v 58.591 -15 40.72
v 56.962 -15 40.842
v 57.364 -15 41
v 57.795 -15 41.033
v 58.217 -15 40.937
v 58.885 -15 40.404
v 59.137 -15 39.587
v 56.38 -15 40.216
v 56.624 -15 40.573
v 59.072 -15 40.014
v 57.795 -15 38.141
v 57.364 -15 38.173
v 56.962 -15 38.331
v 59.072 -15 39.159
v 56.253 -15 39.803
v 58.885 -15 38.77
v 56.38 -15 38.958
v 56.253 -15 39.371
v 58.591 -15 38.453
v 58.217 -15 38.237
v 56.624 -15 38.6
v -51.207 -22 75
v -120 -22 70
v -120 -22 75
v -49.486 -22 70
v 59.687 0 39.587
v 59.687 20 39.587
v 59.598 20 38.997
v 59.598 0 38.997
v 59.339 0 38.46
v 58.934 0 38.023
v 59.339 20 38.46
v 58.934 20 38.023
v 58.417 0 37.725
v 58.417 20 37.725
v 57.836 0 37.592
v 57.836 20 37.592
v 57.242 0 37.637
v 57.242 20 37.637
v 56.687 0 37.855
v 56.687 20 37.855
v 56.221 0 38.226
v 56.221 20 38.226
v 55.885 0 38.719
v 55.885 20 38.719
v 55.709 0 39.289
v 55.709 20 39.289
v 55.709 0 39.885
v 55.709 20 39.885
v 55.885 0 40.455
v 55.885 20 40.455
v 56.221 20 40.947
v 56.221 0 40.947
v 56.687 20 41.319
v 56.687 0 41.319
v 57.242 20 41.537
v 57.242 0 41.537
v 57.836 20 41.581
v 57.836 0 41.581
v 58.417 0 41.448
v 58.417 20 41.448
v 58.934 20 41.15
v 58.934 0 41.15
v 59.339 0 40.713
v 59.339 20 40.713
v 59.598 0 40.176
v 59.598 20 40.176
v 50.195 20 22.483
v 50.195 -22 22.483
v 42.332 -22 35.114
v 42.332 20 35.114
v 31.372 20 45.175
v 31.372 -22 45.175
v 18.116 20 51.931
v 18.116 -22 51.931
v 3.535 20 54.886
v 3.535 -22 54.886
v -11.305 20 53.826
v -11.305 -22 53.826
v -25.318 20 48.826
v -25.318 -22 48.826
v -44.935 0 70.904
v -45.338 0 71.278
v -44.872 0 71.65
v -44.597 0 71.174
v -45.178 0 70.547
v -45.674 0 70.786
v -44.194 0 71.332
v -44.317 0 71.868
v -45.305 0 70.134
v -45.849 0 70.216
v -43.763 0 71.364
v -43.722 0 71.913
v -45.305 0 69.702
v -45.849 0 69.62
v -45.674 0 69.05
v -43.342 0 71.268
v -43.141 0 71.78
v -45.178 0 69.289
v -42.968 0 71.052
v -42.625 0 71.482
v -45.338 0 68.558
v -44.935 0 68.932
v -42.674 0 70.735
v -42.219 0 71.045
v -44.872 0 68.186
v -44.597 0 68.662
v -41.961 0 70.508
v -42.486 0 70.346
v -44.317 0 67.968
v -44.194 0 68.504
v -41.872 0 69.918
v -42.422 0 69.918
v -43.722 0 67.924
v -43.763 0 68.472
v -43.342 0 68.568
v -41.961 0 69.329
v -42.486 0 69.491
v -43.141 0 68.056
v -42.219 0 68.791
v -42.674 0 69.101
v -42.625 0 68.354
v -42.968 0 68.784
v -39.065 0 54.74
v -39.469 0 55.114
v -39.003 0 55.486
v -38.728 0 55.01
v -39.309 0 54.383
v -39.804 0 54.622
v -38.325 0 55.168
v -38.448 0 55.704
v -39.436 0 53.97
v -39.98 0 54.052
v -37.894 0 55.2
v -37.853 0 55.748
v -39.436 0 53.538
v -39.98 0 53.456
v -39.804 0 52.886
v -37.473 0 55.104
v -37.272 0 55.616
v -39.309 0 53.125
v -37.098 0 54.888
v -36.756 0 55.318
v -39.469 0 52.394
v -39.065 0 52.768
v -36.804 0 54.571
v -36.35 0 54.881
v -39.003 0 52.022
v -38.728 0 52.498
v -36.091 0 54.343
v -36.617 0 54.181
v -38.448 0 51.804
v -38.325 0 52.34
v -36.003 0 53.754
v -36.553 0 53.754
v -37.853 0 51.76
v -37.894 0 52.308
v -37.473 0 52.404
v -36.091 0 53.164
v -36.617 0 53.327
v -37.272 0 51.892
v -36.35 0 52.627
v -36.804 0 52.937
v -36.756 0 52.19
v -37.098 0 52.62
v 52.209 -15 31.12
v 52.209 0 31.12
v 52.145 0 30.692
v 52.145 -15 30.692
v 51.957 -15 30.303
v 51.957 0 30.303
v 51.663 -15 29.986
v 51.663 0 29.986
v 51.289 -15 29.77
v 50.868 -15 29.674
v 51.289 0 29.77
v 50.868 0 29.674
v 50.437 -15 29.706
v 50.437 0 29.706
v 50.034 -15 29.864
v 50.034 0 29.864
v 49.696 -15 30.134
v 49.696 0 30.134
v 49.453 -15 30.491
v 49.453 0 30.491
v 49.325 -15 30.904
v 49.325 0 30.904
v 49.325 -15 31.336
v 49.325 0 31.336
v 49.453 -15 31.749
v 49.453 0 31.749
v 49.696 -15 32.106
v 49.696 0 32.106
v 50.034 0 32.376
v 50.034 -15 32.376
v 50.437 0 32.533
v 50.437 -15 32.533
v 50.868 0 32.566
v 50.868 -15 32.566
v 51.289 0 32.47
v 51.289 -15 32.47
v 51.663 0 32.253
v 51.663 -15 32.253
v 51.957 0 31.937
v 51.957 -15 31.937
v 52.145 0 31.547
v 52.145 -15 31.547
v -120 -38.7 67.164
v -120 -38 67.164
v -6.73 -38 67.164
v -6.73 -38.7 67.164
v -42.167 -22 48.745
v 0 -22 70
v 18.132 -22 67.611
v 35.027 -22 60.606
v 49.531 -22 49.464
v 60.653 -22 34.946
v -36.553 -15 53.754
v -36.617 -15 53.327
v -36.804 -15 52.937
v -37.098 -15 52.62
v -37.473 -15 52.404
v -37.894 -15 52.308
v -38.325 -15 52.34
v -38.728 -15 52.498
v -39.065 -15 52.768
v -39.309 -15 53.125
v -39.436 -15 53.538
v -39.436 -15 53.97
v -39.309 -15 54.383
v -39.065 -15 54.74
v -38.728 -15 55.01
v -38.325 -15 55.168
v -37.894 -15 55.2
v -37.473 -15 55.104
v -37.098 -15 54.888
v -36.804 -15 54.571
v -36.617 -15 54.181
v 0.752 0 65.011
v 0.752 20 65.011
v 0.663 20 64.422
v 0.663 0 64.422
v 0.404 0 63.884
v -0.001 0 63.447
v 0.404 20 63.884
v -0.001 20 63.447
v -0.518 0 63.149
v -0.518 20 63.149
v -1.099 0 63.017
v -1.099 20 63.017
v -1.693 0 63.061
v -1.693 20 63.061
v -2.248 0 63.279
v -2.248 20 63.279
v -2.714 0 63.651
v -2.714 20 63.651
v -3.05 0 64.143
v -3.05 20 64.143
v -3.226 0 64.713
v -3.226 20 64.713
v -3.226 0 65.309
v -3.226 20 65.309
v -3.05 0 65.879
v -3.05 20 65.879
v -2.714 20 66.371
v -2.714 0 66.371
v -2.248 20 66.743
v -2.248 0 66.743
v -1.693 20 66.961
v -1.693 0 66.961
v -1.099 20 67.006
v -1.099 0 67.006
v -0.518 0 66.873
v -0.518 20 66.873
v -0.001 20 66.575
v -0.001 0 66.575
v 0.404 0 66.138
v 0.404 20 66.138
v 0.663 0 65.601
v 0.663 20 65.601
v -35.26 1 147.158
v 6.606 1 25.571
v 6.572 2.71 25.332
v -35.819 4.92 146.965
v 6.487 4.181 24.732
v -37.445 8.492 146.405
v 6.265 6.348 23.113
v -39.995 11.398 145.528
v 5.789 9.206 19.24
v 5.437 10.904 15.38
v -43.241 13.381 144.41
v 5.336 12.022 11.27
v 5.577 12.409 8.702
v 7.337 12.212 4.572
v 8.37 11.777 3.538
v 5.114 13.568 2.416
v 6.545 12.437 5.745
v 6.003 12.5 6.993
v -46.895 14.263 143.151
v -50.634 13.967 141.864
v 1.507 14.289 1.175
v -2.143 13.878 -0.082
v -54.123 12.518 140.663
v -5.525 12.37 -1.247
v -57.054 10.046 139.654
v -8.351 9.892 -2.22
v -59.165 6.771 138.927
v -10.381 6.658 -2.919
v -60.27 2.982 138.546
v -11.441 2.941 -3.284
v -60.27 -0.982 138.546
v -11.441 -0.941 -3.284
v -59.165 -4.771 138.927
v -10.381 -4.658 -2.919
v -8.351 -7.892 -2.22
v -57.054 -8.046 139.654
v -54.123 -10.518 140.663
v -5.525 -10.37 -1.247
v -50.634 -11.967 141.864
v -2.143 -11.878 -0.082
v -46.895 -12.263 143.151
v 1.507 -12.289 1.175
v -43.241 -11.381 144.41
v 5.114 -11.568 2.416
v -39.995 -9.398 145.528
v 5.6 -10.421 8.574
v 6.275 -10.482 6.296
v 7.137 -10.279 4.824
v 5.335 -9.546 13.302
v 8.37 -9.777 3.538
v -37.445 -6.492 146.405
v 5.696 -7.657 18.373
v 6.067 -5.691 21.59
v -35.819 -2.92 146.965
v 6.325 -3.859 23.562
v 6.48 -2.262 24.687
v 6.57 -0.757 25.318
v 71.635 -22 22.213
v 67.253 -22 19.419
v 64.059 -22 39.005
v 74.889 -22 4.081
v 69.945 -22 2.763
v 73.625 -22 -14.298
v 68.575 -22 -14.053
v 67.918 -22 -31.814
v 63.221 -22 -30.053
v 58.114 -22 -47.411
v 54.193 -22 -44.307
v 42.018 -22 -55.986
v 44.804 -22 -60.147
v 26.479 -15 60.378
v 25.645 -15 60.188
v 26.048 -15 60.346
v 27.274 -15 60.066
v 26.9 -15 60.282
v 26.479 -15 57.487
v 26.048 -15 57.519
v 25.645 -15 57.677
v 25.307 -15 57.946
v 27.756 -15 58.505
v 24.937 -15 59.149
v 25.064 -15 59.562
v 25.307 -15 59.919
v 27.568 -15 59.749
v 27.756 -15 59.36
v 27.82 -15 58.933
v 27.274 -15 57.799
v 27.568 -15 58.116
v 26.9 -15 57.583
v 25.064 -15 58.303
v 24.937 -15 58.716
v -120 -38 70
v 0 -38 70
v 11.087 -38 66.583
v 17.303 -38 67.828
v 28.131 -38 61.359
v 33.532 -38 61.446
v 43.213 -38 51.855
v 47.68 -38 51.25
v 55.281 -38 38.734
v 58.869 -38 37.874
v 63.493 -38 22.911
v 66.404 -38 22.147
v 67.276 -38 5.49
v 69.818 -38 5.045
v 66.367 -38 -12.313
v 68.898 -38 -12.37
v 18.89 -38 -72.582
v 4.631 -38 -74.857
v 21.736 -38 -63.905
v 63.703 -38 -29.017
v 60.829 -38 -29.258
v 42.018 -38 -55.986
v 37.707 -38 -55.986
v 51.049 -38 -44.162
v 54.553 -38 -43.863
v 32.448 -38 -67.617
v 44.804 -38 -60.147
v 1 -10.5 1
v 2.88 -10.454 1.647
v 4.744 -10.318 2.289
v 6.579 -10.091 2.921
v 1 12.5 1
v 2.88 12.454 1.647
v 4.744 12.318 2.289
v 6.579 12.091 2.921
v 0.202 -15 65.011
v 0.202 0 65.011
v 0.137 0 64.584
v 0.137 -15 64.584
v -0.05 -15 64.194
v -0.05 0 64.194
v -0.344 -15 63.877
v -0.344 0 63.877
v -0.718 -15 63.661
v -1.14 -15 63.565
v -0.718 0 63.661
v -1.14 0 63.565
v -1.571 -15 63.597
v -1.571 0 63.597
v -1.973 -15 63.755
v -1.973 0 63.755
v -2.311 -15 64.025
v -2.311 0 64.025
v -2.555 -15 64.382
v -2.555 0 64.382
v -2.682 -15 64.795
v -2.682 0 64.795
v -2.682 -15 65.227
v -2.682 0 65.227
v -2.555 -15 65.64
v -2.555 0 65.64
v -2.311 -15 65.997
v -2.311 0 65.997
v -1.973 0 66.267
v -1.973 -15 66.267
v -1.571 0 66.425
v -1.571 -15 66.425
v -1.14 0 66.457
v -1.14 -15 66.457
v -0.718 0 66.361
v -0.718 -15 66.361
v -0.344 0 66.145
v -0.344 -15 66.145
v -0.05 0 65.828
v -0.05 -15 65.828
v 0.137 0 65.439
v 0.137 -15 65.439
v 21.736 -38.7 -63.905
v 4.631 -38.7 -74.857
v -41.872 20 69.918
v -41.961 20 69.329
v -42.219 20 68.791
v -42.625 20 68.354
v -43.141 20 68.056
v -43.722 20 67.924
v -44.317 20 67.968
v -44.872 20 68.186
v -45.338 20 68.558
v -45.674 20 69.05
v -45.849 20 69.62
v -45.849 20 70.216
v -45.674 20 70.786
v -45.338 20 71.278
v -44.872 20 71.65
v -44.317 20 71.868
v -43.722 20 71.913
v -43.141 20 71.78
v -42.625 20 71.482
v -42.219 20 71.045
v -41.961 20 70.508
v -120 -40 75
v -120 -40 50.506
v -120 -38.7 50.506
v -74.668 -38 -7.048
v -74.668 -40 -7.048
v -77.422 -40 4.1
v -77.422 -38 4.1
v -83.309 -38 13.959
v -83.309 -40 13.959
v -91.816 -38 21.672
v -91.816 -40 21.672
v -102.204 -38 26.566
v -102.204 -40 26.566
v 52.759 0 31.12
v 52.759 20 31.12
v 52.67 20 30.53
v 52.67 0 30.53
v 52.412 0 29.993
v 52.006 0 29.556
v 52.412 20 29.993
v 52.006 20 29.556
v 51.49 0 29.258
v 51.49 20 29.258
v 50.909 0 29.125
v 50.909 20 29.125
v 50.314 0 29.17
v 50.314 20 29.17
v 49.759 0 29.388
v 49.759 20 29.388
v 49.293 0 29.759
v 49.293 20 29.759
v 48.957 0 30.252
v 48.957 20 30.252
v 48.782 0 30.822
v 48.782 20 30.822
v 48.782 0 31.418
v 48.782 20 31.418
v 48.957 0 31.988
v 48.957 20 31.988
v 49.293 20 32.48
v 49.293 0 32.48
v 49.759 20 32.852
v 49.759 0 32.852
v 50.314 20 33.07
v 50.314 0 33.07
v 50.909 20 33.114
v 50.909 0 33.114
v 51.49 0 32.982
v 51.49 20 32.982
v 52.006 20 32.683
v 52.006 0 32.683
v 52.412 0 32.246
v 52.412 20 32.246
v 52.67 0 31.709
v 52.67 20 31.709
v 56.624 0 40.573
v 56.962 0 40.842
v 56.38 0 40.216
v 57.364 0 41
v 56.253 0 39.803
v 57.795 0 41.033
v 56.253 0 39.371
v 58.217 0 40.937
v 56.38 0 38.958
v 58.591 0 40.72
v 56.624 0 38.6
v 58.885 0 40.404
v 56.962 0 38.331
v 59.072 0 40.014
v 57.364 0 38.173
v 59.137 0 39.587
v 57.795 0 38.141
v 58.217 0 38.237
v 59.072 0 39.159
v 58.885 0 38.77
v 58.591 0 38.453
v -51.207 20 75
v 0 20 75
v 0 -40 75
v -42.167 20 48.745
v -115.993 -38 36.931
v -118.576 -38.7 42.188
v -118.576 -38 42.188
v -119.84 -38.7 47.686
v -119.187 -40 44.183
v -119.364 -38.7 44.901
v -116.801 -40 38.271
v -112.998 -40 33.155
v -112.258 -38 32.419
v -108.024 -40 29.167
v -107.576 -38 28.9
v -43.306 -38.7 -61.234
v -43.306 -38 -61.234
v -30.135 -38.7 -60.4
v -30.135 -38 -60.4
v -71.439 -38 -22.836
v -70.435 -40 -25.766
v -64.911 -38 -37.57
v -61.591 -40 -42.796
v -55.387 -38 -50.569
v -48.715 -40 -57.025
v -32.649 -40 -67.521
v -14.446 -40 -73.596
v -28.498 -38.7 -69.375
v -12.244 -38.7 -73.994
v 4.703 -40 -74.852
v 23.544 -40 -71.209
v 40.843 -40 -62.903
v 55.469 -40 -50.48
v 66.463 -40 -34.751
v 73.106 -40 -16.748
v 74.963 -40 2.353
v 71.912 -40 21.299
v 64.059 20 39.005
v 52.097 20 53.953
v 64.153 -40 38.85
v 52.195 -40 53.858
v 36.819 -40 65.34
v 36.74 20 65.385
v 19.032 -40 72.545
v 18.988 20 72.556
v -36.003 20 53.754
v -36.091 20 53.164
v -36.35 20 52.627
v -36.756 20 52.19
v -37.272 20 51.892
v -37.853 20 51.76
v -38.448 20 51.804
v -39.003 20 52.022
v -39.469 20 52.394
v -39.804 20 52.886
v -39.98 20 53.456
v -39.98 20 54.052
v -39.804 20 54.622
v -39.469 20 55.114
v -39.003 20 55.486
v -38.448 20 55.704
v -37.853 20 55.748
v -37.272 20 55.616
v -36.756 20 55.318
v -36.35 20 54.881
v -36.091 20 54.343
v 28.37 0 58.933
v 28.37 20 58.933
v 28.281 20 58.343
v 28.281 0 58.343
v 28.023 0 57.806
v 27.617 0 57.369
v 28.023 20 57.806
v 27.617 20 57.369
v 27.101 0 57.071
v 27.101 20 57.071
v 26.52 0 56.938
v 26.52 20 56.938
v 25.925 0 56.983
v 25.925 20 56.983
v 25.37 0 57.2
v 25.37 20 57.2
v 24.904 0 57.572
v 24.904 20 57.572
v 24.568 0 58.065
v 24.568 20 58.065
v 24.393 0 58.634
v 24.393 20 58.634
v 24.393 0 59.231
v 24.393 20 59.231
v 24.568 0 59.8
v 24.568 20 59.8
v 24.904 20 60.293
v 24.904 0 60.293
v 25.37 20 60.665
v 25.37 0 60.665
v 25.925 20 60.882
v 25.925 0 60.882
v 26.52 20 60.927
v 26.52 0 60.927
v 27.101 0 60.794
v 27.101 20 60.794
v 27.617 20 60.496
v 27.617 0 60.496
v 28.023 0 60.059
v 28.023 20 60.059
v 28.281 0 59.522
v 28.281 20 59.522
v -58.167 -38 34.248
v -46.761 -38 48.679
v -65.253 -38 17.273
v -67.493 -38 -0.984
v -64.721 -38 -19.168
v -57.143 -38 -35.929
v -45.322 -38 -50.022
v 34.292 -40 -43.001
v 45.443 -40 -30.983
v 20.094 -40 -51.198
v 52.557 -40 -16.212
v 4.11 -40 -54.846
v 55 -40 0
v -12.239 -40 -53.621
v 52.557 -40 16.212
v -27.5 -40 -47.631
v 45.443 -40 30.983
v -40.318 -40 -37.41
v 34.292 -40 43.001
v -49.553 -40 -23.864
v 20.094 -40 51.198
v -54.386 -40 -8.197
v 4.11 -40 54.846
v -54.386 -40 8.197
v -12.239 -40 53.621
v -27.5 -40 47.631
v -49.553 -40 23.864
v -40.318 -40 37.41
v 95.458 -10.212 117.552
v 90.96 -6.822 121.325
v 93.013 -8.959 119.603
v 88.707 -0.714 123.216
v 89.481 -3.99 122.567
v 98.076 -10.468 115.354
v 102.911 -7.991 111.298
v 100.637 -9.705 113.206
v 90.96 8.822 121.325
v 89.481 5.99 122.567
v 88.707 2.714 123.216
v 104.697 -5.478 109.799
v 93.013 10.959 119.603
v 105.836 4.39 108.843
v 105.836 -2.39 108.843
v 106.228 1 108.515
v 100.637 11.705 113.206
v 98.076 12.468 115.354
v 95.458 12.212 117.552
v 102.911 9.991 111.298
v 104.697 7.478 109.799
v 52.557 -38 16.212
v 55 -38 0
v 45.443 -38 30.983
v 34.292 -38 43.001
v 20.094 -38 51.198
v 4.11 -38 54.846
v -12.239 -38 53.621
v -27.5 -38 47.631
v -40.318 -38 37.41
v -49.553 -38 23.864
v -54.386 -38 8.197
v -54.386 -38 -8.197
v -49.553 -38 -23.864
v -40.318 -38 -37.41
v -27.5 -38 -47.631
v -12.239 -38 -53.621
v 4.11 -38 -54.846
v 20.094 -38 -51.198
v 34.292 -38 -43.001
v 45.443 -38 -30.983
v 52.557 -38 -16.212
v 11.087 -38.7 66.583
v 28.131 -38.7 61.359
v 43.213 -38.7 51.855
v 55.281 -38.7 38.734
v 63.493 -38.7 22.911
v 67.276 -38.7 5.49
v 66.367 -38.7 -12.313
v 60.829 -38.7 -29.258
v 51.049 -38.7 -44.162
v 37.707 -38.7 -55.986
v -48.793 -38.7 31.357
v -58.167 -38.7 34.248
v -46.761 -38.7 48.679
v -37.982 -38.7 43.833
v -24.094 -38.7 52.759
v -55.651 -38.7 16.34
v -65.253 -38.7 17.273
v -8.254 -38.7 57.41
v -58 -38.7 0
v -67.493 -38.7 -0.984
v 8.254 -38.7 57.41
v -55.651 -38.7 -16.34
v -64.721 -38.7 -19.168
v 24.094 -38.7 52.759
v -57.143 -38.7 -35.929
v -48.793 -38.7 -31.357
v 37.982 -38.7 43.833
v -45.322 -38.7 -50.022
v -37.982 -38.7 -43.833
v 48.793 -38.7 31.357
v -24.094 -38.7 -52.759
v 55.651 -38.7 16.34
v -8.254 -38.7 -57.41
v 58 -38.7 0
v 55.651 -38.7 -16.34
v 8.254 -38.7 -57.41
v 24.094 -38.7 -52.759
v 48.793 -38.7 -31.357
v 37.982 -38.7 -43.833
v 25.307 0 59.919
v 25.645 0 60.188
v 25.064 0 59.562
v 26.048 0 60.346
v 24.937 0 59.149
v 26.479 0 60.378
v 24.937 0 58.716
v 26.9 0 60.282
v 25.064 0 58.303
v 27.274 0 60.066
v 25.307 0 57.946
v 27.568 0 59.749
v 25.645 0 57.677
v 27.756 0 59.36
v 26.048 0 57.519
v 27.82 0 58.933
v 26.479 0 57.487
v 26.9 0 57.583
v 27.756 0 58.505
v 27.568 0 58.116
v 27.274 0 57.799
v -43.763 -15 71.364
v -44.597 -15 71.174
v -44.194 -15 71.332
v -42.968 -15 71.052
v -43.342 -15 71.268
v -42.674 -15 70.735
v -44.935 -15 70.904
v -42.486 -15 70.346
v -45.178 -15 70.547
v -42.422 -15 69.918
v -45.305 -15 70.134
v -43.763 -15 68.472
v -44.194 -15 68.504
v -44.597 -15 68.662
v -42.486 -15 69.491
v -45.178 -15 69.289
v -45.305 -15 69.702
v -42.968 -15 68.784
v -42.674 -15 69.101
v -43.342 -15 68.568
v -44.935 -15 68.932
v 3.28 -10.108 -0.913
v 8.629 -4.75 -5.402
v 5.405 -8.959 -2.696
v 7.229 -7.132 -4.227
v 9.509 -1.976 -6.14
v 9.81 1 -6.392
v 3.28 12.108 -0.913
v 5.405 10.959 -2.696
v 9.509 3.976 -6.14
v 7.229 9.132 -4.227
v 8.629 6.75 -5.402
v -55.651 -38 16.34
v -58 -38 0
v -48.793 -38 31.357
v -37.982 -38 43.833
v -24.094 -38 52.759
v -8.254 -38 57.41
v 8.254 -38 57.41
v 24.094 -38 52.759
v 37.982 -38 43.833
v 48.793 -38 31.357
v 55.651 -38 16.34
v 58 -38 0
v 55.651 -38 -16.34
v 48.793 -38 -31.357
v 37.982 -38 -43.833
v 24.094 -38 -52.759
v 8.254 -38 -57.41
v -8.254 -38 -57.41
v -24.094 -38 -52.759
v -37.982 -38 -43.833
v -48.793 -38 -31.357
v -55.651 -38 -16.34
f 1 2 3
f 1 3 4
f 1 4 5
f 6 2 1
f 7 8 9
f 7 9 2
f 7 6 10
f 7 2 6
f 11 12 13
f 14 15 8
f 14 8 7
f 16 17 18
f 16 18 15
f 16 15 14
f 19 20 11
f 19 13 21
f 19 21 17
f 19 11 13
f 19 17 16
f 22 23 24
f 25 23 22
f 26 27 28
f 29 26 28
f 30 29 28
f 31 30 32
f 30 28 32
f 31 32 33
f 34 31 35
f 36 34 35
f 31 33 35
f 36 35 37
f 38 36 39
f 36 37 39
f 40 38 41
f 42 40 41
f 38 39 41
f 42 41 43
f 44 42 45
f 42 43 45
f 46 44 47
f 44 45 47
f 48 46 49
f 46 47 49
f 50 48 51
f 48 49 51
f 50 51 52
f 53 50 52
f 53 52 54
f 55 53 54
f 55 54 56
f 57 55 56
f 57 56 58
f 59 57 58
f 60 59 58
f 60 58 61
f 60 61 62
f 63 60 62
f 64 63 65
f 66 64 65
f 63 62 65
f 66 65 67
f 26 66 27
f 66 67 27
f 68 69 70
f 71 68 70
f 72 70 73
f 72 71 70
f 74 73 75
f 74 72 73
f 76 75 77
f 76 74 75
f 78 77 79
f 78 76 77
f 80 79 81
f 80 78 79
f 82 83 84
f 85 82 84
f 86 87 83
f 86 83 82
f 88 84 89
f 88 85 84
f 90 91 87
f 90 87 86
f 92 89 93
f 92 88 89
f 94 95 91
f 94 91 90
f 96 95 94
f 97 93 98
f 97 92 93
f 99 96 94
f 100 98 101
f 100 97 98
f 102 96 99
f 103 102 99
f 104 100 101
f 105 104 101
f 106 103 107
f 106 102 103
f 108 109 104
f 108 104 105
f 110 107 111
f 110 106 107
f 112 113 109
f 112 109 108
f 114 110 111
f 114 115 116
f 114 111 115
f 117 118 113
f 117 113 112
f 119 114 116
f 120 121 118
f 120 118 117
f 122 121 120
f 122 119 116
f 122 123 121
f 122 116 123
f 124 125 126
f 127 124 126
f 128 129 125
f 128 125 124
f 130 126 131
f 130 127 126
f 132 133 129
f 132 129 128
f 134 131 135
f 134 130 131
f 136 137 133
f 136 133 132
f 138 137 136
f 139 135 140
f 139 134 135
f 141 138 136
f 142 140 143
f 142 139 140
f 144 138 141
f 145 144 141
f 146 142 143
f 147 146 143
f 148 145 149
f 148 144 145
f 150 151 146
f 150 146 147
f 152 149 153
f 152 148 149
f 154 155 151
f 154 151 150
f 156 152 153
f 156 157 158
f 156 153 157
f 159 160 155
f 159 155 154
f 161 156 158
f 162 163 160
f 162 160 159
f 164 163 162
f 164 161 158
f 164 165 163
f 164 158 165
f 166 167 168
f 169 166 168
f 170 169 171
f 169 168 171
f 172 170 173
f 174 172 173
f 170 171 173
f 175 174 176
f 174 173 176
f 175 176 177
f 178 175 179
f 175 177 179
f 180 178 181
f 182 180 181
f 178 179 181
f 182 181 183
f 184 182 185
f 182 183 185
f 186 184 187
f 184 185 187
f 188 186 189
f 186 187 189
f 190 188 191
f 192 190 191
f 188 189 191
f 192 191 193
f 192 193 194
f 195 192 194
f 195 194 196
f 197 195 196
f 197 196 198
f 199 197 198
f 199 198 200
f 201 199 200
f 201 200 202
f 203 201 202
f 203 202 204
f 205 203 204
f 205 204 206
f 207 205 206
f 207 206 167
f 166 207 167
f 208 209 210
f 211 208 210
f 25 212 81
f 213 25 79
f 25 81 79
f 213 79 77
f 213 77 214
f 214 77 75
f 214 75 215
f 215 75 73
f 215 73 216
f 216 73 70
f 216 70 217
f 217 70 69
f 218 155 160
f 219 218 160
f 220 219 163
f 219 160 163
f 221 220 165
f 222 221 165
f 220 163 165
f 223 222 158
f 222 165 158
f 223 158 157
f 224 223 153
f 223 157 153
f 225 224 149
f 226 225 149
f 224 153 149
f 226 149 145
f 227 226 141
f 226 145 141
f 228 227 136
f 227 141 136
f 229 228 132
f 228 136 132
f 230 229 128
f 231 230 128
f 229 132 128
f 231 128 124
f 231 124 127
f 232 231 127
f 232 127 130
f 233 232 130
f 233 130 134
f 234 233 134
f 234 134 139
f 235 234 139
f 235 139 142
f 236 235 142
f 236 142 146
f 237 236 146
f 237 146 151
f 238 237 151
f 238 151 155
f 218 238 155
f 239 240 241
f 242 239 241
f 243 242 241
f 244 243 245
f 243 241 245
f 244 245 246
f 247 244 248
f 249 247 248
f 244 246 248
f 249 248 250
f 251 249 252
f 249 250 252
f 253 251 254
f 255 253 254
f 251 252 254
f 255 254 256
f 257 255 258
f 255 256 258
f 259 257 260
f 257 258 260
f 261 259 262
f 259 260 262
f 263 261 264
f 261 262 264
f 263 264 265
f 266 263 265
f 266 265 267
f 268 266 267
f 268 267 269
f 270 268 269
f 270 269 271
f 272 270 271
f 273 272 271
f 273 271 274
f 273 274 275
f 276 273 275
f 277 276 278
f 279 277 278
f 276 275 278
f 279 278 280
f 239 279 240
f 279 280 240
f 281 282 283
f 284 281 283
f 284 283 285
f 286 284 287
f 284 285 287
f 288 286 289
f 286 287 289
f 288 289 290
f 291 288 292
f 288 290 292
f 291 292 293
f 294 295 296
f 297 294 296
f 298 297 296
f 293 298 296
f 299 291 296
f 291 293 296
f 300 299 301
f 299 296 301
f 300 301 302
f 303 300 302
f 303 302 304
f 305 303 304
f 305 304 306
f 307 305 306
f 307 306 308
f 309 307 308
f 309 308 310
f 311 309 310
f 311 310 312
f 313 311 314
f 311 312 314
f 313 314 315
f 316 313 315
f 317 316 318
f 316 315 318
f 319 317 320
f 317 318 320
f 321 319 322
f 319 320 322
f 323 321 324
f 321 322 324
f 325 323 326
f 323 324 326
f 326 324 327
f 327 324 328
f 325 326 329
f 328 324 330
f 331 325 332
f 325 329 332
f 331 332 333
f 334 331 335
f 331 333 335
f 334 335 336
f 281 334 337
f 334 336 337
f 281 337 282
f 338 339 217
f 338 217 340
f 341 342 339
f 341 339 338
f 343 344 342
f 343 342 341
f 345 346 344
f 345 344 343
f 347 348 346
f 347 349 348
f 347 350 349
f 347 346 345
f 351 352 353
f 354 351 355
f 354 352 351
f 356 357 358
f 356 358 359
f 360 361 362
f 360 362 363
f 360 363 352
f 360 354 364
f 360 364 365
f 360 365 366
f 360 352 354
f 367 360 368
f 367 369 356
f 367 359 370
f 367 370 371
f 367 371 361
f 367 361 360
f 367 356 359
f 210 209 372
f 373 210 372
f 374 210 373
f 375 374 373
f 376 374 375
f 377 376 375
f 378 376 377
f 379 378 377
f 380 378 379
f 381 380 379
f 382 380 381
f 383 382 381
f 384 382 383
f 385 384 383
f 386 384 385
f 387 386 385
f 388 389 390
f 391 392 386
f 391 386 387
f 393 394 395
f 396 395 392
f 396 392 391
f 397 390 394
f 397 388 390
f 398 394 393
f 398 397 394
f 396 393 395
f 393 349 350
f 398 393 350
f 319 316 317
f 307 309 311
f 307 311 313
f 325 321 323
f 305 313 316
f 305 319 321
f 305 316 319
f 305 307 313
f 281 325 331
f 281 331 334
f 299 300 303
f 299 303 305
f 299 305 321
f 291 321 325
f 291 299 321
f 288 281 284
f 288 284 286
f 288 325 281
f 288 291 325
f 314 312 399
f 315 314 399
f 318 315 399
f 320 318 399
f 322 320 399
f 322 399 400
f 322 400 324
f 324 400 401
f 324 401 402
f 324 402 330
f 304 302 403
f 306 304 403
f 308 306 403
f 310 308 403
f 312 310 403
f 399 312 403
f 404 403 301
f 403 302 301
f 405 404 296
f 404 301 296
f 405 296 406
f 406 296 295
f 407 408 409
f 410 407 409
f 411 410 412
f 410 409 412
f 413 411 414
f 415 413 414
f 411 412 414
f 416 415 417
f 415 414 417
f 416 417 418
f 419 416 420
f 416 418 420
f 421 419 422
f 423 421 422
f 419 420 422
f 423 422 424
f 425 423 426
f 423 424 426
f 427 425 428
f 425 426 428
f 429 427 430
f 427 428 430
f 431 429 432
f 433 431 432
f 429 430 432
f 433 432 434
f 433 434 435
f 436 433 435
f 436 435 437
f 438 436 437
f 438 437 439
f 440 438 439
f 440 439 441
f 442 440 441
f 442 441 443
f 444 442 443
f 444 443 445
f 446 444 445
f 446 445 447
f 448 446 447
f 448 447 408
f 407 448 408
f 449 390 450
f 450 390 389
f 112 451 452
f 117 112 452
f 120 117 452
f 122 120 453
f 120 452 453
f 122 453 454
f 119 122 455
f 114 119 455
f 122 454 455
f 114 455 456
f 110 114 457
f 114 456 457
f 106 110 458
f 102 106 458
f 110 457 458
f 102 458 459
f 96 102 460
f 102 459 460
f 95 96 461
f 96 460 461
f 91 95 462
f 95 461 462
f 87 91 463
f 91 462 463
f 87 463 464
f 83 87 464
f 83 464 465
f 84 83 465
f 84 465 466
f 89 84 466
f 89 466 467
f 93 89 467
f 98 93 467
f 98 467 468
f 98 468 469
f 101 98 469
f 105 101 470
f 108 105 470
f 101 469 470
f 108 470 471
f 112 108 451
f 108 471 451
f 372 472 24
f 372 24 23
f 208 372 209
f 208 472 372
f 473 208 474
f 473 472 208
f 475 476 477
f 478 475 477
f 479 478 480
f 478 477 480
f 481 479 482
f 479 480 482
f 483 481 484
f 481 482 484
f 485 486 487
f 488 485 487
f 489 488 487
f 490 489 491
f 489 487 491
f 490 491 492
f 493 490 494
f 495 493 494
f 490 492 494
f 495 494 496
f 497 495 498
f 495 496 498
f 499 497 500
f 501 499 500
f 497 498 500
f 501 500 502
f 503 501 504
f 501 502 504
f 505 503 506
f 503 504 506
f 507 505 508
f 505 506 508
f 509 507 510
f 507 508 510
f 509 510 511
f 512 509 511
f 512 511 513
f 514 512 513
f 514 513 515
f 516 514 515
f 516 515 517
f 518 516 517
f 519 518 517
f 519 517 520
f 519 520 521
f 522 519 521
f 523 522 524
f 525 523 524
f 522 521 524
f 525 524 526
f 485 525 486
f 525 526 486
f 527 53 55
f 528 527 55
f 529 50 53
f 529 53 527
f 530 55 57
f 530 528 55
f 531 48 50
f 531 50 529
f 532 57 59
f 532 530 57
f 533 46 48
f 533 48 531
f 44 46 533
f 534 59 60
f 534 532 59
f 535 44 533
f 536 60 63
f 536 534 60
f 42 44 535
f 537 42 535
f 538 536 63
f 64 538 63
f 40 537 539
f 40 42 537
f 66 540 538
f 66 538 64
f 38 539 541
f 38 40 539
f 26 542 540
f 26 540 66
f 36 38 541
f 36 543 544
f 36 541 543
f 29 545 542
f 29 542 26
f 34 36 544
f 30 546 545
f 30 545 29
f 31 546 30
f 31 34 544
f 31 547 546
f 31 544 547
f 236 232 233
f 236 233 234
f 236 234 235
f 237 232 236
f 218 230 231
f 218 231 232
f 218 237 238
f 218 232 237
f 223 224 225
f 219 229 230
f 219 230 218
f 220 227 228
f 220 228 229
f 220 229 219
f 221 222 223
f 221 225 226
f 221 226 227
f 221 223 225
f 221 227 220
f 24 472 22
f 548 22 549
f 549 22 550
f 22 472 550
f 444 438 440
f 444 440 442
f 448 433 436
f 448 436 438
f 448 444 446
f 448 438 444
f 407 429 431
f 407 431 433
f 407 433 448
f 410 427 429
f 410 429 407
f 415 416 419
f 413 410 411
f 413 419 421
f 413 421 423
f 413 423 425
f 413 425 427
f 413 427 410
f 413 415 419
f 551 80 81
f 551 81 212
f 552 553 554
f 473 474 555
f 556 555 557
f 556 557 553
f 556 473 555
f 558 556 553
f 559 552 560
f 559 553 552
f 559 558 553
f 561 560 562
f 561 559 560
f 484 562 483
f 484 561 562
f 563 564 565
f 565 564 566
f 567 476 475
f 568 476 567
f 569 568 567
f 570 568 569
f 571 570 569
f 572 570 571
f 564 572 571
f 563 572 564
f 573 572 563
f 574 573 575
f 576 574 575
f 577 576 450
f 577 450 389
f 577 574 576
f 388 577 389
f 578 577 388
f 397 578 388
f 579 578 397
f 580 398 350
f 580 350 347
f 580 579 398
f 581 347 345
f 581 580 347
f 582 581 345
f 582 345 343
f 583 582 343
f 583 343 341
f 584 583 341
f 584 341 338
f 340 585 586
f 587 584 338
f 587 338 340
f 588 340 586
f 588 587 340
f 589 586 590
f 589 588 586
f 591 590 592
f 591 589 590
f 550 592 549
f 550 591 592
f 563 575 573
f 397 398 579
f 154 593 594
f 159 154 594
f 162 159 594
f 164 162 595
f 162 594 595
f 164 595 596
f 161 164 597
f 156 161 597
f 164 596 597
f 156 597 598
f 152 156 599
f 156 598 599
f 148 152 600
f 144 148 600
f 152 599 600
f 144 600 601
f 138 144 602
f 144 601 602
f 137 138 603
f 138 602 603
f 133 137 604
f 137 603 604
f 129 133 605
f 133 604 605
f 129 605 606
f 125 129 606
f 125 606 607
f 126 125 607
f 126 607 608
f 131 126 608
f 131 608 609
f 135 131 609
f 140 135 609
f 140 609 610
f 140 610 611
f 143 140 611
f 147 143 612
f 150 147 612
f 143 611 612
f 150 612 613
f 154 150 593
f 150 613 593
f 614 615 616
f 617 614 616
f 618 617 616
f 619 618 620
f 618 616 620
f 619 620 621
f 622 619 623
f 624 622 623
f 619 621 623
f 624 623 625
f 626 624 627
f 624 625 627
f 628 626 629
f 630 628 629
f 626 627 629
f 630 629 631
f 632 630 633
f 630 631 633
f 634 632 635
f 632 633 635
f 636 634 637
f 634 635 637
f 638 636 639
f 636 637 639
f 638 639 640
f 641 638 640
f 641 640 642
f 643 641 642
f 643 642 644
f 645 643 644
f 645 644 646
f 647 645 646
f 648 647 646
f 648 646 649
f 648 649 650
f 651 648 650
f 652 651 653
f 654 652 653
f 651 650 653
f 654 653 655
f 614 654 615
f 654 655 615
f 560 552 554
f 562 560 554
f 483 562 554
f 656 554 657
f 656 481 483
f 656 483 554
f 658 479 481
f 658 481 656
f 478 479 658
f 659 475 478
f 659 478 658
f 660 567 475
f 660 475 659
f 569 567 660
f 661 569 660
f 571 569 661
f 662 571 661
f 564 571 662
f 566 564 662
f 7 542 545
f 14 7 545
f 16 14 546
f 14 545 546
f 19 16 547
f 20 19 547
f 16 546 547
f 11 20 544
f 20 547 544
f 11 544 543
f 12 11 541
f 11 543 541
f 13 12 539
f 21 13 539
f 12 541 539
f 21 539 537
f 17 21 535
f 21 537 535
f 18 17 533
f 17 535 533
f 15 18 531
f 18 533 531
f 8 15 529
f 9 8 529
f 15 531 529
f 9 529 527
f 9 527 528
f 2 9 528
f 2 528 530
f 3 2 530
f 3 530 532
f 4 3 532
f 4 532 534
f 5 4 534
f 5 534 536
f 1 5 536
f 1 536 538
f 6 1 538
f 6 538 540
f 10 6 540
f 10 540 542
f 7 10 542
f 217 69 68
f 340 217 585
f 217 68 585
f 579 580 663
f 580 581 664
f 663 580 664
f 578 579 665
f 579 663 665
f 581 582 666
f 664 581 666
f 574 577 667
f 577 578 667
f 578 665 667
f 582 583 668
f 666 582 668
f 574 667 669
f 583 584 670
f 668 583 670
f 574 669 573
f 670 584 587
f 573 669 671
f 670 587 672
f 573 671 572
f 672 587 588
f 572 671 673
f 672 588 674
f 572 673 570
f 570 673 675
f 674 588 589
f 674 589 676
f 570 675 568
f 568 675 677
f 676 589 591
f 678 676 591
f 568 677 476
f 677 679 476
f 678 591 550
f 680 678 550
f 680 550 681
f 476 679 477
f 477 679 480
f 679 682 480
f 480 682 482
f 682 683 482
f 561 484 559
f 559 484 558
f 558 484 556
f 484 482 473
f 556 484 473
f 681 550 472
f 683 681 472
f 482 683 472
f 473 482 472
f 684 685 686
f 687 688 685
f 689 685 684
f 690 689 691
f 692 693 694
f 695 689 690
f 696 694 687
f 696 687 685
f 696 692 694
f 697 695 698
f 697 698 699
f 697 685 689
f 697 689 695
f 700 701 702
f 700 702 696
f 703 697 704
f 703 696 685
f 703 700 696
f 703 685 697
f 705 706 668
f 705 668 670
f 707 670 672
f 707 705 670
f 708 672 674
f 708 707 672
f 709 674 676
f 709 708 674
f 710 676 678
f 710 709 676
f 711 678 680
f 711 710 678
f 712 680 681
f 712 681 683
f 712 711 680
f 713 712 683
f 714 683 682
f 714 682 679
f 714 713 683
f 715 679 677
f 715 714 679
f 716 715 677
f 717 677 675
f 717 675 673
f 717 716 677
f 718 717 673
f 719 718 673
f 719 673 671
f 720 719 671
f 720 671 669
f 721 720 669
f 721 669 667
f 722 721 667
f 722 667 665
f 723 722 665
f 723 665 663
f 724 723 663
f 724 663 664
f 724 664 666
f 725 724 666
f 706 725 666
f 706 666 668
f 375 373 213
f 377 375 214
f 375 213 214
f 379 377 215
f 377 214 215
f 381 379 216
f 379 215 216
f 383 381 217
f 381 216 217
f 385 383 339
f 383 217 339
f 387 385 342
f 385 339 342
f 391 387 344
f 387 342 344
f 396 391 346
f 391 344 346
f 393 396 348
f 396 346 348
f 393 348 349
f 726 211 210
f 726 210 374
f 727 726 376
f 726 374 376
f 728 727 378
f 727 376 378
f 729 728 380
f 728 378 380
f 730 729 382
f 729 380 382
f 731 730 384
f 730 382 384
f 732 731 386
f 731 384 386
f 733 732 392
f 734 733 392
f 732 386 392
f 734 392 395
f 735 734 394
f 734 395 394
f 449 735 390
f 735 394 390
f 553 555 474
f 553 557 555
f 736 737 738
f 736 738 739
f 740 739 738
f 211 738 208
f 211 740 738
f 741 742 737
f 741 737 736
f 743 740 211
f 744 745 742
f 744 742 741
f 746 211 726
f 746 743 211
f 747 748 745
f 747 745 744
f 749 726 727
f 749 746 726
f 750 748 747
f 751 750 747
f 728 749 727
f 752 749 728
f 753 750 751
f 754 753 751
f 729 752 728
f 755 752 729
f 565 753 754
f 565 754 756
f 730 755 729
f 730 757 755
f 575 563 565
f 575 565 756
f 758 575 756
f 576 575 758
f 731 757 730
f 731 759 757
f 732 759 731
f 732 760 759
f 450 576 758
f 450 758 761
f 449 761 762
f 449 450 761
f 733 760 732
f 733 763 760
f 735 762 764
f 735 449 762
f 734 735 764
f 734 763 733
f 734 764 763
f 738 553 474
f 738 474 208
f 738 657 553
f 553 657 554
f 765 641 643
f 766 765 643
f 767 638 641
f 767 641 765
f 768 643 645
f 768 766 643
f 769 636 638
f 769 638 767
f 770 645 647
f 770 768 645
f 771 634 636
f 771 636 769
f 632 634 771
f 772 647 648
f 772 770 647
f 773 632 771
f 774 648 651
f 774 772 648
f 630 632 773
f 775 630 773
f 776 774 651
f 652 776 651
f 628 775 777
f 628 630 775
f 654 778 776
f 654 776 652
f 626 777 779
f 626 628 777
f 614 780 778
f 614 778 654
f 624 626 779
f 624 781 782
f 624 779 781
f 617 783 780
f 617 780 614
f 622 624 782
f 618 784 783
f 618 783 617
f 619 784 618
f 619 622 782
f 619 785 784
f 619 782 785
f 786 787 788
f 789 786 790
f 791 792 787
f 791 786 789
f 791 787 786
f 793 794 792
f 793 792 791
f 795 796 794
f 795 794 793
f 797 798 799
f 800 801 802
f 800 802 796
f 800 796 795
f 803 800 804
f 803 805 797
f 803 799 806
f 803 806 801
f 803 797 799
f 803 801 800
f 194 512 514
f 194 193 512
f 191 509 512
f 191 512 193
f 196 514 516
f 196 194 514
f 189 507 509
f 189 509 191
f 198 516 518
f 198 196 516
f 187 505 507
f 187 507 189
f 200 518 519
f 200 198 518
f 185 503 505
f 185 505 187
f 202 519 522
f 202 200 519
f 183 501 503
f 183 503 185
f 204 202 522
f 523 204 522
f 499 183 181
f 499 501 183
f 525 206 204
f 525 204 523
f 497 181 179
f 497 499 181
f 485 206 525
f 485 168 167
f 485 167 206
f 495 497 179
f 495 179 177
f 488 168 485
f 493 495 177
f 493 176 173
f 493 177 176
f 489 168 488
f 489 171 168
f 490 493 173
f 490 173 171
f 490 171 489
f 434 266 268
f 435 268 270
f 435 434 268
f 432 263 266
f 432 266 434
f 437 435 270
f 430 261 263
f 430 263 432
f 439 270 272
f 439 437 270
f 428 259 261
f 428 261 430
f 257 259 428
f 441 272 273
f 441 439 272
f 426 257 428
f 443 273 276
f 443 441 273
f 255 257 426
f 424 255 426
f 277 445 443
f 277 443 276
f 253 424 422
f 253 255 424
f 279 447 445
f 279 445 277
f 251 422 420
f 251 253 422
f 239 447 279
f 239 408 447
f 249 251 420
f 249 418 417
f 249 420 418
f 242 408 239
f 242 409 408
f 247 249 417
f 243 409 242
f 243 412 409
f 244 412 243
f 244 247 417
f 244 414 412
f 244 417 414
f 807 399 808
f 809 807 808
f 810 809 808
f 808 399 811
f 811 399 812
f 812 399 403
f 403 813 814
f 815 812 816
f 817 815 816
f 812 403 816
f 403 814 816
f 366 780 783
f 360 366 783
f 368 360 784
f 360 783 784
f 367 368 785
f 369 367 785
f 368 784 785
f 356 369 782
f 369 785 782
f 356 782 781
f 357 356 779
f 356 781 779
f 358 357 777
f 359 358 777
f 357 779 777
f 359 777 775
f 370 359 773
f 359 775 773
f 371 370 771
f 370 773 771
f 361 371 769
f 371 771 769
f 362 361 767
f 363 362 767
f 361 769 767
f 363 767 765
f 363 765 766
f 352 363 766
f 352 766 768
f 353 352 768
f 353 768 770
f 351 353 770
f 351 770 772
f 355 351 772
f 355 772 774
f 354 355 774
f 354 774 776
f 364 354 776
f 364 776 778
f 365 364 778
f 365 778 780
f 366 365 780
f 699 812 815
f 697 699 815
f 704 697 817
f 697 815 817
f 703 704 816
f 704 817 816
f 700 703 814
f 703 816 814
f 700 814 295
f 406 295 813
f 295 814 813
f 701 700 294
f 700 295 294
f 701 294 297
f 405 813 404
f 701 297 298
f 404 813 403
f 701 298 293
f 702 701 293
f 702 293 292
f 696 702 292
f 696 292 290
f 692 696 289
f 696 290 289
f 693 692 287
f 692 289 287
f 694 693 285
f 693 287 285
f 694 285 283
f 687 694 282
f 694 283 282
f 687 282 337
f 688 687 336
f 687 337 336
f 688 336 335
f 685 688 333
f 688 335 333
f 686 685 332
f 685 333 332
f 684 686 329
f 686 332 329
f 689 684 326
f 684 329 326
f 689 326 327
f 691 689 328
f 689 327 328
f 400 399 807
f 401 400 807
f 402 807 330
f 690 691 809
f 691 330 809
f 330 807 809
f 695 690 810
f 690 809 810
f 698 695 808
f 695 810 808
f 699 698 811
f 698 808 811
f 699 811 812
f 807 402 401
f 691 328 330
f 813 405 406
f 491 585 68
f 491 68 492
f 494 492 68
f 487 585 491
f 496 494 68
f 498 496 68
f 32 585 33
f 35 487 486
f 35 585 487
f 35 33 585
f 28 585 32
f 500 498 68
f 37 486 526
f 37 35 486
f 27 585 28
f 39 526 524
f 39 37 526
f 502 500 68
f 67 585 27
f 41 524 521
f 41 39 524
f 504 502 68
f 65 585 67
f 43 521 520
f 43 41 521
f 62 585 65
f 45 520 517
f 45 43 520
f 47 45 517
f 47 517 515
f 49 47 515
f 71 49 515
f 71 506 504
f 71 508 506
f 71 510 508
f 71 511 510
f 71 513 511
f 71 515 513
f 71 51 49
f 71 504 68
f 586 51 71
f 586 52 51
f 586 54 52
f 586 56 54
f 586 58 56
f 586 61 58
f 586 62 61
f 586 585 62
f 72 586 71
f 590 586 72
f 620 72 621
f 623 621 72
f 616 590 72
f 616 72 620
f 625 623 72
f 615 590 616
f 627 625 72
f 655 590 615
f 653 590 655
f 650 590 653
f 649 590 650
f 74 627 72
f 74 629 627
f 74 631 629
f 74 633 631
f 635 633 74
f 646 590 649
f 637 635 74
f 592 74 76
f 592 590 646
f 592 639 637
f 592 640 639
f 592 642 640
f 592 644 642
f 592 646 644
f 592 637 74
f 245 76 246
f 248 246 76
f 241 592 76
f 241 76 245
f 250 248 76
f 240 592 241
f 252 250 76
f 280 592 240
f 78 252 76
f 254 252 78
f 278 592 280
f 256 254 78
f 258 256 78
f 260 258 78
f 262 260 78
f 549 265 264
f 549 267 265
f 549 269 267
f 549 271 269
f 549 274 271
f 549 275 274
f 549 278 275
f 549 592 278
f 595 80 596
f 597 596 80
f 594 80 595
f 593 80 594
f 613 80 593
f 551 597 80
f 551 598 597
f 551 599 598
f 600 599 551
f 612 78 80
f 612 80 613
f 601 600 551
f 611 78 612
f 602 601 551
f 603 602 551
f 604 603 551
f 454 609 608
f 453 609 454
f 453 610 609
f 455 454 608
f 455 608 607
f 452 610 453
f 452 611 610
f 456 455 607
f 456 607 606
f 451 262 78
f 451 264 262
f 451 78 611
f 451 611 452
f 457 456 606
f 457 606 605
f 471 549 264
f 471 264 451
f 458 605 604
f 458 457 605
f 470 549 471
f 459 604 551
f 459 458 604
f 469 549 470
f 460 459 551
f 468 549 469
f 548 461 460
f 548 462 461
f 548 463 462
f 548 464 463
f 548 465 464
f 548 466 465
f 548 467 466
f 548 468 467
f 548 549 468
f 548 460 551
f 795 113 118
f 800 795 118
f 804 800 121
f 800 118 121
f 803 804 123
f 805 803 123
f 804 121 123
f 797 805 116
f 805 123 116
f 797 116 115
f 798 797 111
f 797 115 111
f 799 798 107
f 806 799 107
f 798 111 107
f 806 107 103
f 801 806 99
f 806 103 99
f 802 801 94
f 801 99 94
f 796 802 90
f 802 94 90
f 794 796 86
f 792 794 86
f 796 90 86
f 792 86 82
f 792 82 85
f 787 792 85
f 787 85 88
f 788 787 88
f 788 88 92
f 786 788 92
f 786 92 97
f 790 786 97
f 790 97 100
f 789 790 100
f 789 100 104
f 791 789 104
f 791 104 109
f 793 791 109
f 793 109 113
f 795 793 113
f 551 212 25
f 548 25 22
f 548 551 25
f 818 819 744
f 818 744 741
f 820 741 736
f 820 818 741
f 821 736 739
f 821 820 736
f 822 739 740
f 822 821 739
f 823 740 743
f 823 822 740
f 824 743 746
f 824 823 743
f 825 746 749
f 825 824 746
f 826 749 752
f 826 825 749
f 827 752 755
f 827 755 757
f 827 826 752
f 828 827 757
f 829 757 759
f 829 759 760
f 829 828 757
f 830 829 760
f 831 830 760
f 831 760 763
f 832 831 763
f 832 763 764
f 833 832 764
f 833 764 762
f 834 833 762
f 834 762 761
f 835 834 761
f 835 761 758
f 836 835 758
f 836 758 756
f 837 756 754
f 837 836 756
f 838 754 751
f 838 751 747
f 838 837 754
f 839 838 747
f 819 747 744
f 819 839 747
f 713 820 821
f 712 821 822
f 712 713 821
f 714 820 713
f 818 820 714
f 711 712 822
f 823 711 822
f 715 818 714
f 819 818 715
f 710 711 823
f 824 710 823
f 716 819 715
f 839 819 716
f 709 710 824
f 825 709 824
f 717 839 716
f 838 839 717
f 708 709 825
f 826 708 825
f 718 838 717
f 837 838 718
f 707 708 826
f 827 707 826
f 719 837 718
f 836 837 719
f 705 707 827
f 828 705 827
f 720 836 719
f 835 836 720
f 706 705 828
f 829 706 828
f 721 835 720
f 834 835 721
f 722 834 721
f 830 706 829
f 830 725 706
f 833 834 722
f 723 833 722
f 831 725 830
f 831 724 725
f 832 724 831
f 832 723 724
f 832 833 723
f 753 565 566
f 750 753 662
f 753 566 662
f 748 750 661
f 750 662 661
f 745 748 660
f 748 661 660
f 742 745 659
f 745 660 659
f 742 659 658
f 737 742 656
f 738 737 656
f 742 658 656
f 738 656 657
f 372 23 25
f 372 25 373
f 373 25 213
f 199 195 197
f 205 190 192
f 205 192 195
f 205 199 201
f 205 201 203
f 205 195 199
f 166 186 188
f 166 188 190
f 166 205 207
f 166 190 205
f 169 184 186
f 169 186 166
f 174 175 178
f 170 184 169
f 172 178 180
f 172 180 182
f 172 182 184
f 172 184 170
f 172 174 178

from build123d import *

# Parameters (mm, degrees)
SKETCH_R                    = 55
PAD_DEPTH                   = 40
PAD_DEPTH_BACK              = 20
POCKET_DEPTH                = 42
POCKET001_DEPTH             = 16
SKETCH004_R                 = 67.5
SKETCH004_R_2               = 58
POCKET002_DEPTH             = 0.7
POCKET003_DEPTH             = 0.7
SKETCH006_R                 = 1.45
POCKET004_DEPTH             = 35
SKETCH007_R                 = 2
POCKET005_DEPTH             = 20
CYLINDER001_R               = 13.3
CYLINDER001_DEPTH           = 150
CYLINDER001_PLACEMENT_ANGLE = 341
CYLINDER_R                  = 11.5
CYLINDER_DEPTH              = 150
CYLINDER_PLACEMENT_ANGLE    = 40


with BuildPart() as body:
    # Sketch → Pad (new body, two sides)
    with BuildSketch(Plane.XZ) as pad_sk:
        with BuildLine():
            Line((-120, 75), (0, 75))
            ThreePointArc((-74.66808, -7.048245), (55.468993, -50.479608), (0, 75))
            ThreePointArc((-74.66808, -7.048245), (-83.30852, 13.959176), (-102.203647, 26.566441))
            ThreePointArc((-120, 50.506104), (-115.063539, 35.591198), (-102.203647, 26.566441))
            Line((-120, 75), (-120, 50.506104))
        make_face()
        Circle(SKETCH_R, mode=Mode.SUBTRACT)
    extrude(amount=PAD_DEPTH)
    extrude(pad_sk.sketch, amount=-PAD_DEPTH_BACK)

    # Sketch001 (on Face7 of Pad) → Pocket (cut)
    with BuildSketch(Plane(origin=(0, 20, 0), x_dir=(1, 0, 0), z_dir=(0, 1, 0))):
        with BuildLine():
            Line((46.551104, -18.140074), (74.636799, -51.611301))
            ThreePointArc((74.636799, -51.611301), (27.033088, 86.623267), (-90.743475, 0))
            Line((-211.758942, -108.831918), (-90.743475, 0))
            Line((-62.856731, -108.831918), (-211.758942, -108.831918))
            Line((-42.167317, -48.745498), (-62.856731, -108.831918))
            Line((9.780971, -48.993879), (-42.167317, -48.745498))
            Line((46.551104, -18.140074), (9.780971, -48.993879))
        make_face()
    extrude(amount=-POCKET_DEPTH, mode=Mode.SUBTRACT)

    # Sketch003 (on Face2 of Pocket) → Pocket001 (cut)
    with BuildSketch(Plane(origin=(0, -22, 0), x_dir=(1, 0, 0), z_dir=(0, 1, 0))):
        with BuildLine():
            ThreePointArc((0, -70), (66.404243, -22.146705), (42.018147, 55.986385))
            Line((42.018147, 55.986385), (62.226624, 86.16832))
            Line((62.226624, 86.16832), (-170.809082, 86.16832))
            Line((-170.809082, 86.16832), (-170.809082, -70))
            Line((-170.809082, -70), (0, -70))
        make_face()
    extrude(amount=-POCKET001_DEPTH, mode=Mode.SUBTRACT)

    # Sketch004 → Pocket002 (cut)
    with BuildSketch(Plane(origin=(0, -38, 0), x_dir=(-1, 0, 0), z_dir=(0, 1, 0))):
        Circle(SKETCH004_R)
        Circle(SKETCH004_R_2, mode=Mode.SUBTRACT)
    extrude(amount=-POCKET002_DEPTH, mode=Mode.SUBTRACT)

    # Sketch005 (on Face14 of Pocket002) → Pocket003 (cut)
    with BuildSketch(Plane(origin=(0, -38, 0), x_dir=(1, 0, 0), z_dir=(0, 1, 0))):
        Polygon((-1.938341, -67.163612), (-30.996857, -50.103622), (-171.92012, -37.367233), (-166.878586, -67.163612), align=None)
        Polygon((33.504612, 56.368855), (-47.315361, 108.119194), (-132.927017, 66.910591), align=None)
    extrude(amount=-POCKET003_DEPTH, mode=Mode.SUBTRACT)

    # Sketch006 (on Face4 of Pocket003) → Pocket004 (cut)
    with BuildSketch(Plane(origin=(0, 20, 0), x_dir=(1, 0, 0), z_dir=(0, 1, 0))):
        with Locations((-38.002514, -53.753925)):
            Circle(SKETCH006_R)
        with Locations((-43.871658, -69.918114)):
            Circle(SKETCH006_R)
        with Locations((-1.248232, -65.011124)):
            Circle(SKETCH006_R)
        with Locations((26.37031, -58.932541)):
            Circle(SKETCH006_R)
        with Locations((50.759274, -31.119787)):
            Circle(SKETCH006_R)
        with Locations((57.686783, -39.586739)):
            Circle(SKETCH006_R)
    extrude(amount=-POCKET004_DEPTH, mode=Mode.SUBTRACT)

    # Sketch007 (on Face4 of Pocket004) → Pocket005 (cut)
    with BuildSketch(Plane(origin=(0, 20, 0), x_dir=(1, 0, 0), z_dir=(0, 1, 0))):
        with Locations((-38.002514, -53.753925)):
            Circle(SKETCH007_R)
        with Locations((-43.871658, -69.918114)):
            Circle(SKETCH007_R)
        with Locations((-1.248232, -65.011124)):
            Circle(SKETCH007_R)
        with Locations((26.37031, -58.932541)):
            Circle(SKETCH007_R)
        with Locations((50.759274, -31.119787)):
            Circle(SKETCH007_R)
        with Locations((57.686783, -39.586739)):
            Circle(SKETCH007_R)
    extrude(amount=-POCKET005_DEPTH, mode=Mode.SUBTRACT)


with BuildPart() as st:
    # Cylinder001 → Cylinder001 (new body)
    with BuildSketch(Plane.XY):
        Circle(CYLINDER001_R)
    extrude(amount=CYLINDER001_DEPTH)


with BuildPart() as st_1:
    # Cylinder001 placement: moved
    add(st.part.moved(Location((1, 1, 1))).rotate(Axis((1, 1, 1), (0, 1, 0)), CYLINDER001_PLACEMENT_ANGLE))


with BuildPart() as fusion:
    # Cylinder → Cylinder (new body)
    with BuildSketch(Plane.XY):
        Circle(CYLINDER_R)
    extrude(amount=CYLINDER_DEPTH)


with BuildPart() as fusion_1:
    # Cylinder placement: moved
    add(fusion.part.moved(Location((1, 1, 1))).rotate(Axis((1, 1, 1), (0, 1, 0)), CYLINDER_PLACEMENT_ANGLE))

    # Fusion: union ST
    add(st_1.part)


solid = Compound([body.part, fusion_1.part])
